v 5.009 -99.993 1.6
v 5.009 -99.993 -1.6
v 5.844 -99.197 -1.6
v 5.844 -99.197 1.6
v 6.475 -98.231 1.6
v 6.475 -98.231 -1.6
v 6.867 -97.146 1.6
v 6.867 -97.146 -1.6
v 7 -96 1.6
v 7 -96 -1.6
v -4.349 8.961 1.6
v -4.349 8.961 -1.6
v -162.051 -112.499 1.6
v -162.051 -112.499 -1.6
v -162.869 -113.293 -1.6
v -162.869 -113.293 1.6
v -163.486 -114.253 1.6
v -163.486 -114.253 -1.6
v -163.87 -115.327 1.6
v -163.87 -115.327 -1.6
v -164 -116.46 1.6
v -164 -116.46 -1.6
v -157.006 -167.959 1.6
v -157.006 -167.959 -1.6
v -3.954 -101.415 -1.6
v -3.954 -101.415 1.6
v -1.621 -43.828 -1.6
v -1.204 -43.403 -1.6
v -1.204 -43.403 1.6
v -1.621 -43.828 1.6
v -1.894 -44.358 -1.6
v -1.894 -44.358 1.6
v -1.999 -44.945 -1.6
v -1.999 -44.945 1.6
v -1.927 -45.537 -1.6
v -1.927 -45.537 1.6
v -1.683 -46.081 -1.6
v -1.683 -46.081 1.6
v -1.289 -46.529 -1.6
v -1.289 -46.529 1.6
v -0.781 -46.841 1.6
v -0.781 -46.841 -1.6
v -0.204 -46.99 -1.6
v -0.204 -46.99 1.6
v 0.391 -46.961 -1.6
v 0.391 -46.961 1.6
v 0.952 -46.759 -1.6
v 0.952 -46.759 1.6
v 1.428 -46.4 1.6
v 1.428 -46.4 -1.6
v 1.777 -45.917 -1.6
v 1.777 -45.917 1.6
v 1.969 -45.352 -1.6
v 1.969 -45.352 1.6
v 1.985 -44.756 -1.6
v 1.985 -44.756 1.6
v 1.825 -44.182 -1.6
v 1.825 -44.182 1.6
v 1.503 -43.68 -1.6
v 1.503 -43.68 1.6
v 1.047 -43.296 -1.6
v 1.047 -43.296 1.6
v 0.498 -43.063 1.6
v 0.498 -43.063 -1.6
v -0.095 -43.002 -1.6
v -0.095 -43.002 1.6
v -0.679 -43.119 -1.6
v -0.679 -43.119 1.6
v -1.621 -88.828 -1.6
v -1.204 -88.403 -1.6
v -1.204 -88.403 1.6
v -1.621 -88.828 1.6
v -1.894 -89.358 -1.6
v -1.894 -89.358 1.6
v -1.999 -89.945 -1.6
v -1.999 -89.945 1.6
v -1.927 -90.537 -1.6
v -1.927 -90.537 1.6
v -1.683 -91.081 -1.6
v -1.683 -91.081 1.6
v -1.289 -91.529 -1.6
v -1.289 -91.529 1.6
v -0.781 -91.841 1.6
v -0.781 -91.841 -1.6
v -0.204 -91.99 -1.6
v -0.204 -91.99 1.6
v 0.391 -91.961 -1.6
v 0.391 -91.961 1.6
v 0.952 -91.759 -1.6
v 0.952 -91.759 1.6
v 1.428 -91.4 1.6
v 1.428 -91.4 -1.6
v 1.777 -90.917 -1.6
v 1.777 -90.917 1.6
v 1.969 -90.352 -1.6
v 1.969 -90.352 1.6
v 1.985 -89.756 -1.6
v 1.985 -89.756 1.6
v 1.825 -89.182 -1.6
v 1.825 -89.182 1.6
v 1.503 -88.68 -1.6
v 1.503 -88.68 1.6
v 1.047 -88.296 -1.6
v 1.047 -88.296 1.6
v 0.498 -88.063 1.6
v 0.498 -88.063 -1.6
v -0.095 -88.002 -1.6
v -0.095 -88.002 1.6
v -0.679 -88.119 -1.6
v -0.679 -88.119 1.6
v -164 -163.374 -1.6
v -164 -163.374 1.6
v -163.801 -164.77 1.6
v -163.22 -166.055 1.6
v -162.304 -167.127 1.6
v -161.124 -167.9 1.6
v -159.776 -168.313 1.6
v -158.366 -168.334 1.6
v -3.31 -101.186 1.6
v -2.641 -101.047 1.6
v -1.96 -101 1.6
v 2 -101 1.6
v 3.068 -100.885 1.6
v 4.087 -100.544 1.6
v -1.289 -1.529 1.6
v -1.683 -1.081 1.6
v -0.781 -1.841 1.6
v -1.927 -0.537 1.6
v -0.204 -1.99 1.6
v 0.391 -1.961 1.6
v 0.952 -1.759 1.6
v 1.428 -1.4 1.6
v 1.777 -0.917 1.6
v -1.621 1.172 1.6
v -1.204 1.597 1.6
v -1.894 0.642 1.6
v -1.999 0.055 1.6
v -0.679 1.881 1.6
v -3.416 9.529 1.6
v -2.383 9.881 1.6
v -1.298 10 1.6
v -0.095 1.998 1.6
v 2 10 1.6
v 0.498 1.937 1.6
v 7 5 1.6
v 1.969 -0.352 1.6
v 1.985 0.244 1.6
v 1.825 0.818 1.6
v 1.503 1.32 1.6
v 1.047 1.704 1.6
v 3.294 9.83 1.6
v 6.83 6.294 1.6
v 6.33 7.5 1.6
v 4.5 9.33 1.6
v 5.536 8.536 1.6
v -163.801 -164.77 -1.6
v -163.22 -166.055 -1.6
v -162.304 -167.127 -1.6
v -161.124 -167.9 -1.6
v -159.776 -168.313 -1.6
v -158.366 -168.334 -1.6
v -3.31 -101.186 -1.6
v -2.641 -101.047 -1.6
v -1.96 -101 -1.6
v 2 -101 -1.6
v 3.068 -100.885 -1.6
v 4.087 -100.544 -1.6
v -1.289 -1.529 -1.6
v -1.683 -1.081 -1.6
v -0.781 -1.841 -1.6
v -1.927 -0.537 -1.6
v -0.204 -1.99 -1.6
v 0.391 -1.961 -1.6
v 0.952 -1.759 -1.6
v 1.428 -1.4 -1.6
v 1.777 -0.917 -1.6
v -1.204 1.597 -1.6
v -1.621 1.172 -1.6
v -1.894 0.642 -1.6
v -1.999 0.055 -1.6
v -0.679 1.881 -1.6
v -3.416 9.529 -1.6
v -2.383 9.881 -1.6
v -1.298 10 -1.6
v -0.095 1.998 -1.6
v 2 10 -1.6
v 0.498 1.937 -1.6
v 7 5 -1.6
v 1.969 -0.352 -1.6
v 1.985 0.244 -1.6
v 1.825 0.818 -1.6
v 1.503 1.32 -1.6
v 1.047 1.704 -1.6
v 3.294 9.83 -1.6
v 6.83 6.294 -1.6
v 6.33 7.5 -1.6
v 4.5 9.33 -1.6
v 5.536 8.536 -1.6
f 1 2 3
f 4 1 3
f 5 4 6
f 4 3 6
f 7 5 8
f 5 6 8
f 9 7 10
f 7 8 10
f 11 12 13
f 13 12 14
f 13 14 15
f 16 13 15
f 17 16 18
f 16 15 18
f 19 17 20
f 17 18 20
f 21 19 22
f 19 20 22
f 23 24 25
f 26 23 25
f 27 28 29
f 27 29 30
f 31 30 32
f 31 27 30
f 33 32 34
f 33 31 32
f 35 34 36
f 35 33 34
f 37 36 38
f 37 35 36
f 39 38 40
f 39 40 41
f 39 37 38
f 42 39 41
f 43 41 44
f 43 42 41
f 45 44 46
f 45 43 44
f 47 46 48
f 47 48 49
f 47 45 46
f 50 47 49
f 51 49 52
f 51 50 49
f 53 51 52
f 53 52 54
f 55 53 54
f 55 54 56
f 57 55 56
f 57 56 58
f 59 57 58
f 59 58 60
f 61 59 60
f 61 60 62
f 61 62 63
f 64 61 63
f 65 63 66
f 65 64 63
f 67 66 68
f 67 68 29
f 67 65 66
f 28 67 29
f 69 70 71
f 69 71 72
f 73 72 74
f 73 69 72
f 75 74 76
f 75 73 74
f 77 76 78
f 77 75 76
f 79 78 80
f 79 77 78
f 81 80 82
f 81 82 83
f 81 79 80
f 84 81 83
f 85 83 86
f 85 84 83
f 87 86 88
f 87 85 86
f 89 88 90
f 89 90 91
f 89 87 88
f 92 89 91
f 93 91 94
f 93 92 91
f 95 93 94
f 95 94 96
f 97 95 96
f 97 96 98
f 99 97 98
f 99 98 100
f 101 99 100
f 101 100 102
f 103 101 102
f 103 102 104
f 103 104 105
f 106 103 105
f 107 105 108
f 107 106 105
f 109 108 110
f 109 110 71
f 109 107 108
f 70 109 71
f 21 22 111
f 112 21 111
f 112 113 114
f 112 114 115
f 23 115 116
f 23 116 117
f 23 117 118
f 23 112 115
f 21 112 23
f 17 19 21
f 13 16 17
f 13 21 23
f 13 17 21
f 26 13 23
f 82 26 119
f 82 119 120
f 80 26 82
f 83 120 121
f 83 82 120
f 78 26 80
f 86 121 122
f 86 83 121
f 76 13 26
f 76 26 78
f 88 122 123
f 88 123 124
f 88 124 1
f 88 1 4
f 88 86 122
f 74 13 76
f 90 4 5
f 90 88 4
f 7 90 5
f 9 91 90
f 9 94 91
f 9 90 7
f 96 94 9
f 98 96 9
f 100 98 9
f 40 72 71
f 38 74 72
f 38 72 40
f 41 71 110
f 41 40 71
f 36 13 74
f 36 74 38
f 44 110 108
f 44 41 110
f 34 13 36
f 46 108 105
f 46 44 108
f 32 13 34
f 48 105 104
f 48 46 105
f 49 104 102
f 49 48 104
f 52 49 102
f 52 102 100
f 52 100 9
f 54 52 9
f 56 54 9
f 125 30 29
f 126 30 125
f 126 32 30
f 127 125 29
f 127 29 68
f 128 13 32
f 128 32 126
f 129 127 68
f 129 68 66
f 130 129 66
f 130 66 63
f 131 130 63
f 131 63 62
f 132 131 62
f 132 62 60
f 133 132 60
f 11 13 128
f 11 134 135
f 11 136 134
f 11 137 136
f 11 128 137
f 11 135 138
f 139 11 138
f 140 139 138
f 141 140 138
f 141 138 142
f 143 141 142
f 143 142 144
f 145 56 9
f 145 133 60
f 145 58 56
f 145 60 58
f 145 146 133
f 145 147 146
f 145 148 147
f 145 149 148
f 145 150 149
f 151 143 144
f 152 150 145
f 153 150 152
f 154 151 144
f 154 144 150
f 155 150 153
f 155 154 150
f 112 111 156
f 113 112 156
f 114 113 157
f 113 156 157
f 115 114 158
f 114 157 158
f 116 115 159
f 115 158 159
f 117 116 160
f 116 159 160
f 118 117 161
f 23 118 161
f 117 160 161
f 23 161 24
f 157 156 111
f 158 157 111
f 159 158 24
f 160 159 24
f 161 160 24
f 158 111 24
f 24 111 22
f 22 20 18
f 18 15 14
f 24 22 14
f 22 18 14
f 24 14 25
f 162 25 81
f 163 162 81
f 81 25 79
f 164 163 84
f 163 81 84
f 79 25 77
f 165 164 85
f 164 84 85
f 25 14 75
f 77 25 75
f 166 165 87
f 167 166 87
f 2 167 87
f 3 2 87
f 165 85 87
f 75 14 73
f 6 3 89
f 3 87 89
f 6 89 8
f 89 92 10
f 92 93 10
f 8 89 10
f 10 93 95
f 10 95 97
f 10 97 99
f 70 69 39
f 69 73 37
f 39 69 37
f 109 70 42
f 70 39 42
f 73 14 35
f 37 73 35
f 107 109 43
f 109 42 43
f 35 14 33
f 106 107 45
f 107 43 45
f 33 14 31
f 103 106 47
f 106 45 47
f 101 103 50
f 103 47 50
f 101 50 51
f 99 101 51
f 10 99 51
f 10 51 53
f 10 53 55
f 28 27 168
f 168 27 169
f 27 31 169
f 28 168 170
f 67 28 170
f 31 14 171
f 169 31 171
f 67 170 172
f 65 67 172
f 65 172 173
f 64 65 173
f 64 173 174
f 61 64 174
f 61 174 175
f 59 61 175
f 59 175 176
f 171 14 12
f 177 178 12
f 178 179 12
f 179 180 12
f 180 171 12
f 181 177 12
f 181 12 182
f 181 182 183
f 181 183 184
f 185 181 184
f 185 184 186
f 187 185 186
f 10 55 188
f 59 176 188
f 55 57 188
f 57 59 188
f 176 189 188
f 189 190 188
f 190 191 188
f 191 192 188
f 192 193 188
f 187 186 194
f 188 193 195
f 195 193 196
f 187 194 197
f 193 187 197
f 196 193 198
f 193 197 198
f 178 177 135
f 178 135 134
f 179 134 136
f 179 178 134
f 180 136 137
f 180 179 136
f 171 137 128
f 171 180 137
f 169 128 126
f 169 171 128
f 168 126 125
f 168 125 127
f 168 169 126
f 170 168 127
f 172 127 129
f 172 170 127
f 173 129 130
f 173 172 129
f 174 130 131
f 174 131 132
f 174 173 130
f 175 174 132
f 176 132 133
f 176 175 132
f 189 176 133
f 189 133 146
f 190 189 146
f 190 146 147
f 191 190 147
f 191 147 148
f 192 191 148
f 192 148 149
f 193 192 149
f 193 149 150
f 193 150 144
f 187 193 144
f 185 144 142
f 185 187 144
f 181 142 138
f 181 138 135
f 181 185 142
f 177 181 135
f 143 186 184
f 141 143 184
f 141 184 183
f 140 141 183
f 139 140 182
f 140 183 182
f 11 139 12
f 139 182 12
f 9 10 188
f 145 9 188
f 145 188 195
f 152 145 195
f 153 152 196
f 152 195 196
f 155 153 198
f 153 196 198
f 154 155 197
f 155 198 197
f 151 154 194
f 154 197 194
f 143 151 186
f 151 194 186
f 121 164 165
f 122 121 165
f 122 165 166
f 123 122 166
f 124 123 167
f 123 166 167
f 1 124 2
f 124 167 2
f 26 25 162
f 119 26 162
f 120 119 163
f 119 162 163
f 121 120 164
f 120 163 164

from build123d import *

# Parameters (mm, degrees)
EXTRUDE_1_DEPTH      = 1.6
EXTRUDE_1_DEPTH_BACK = 1.6


with BuildPart() as part:
    # Эскиз1 → Бобышка-Вытянуть1 (new, two sides: drawn at the far end of the back side and taken through both)
    with BuildSketch(Plane.XY.offset(-EXTRUDE_1_DEPTH_BACK)):
        with BuildLine():
            Line((-4.348647769, 8.961289917), (-162.050931365, -112.49885397))
            ThreePointArc((-162.050931365, -112.49885397), (-163.486349118, -114.252731015), (-164, -116.460143887))
            Line((-164, -116.460143887), (-164, -163.373940781))
            ThreePointArc((-164, -163.373940781), (-161.741518486, -167.555337245), (-157.006369443, -167.959291062))
            Line((-157.006369443, -167.959291062), (-3.953694353, -101.414649719))
            ThreePointArc((-3.953694353, -101.414649719), (-2.978211279, -101.104759893), (-1.960063796, -101))
            Line((-1.960063796, -101), (2, -101))
            ThreePointArc((2, -101), (3.586523282, -100.741618276), (5.009075116, -99.99317755))
            ThreePointArc((5.009075116, -99.99317755), (6.474671808, -98.230989066), (7, -96))
            Line((7, -96), (7, 5))
            ThreePointArc((7, 5), (5.535533906, 8.535533906), (2, 10))
            Line((2, 10), (-1.297716404, 10))
            ThreePointArc((-1.297716404, 10), (-2.909167678, 9.733204495), (-4.348647769, 8.961289917))
        make_face()
        with BuildLine():
            ThreePointArc((1.203630046, -1.59727102), (1.59727102, 1.203630046), (-1.203630046, 1.59727102))
            ThreePointArc((-1.203630046, 1.59727102), (-1.59727102, -1.203630046), (1.203630046, -1.59727102))
        make_face(mode=Mode.SUBTRACT)
        with BuildLine():
            ThreePointArc((1.203630046, -46.59727102), (1.59727102, -43.796369954), (-1.203630046, -43.40272898))
            ThreePointArc((-1.203630046, -43.40272898), (-1.59727102, -46.203630046), (1.203630046, -46.59727102))
        make_face(mode=Mode.SUBTRACT)
        with BuildLine():
            ThreePointArc((1.203630046, -91.59727102), (1.59727102, -88.796369954), (-1.203630046, -88.40272898))
            ThreePointArc((-1.203630046, -88.40272898), (-1.59727102, -91.203630046), (1.203630046, -91.59727102))
        make_face(mode=Mode.SUBTRACT)
    extrude(amount=EXTRUDE_1_DEPTH + EXTRUDE_1_DEPTH_BACK)


solid = part.part
